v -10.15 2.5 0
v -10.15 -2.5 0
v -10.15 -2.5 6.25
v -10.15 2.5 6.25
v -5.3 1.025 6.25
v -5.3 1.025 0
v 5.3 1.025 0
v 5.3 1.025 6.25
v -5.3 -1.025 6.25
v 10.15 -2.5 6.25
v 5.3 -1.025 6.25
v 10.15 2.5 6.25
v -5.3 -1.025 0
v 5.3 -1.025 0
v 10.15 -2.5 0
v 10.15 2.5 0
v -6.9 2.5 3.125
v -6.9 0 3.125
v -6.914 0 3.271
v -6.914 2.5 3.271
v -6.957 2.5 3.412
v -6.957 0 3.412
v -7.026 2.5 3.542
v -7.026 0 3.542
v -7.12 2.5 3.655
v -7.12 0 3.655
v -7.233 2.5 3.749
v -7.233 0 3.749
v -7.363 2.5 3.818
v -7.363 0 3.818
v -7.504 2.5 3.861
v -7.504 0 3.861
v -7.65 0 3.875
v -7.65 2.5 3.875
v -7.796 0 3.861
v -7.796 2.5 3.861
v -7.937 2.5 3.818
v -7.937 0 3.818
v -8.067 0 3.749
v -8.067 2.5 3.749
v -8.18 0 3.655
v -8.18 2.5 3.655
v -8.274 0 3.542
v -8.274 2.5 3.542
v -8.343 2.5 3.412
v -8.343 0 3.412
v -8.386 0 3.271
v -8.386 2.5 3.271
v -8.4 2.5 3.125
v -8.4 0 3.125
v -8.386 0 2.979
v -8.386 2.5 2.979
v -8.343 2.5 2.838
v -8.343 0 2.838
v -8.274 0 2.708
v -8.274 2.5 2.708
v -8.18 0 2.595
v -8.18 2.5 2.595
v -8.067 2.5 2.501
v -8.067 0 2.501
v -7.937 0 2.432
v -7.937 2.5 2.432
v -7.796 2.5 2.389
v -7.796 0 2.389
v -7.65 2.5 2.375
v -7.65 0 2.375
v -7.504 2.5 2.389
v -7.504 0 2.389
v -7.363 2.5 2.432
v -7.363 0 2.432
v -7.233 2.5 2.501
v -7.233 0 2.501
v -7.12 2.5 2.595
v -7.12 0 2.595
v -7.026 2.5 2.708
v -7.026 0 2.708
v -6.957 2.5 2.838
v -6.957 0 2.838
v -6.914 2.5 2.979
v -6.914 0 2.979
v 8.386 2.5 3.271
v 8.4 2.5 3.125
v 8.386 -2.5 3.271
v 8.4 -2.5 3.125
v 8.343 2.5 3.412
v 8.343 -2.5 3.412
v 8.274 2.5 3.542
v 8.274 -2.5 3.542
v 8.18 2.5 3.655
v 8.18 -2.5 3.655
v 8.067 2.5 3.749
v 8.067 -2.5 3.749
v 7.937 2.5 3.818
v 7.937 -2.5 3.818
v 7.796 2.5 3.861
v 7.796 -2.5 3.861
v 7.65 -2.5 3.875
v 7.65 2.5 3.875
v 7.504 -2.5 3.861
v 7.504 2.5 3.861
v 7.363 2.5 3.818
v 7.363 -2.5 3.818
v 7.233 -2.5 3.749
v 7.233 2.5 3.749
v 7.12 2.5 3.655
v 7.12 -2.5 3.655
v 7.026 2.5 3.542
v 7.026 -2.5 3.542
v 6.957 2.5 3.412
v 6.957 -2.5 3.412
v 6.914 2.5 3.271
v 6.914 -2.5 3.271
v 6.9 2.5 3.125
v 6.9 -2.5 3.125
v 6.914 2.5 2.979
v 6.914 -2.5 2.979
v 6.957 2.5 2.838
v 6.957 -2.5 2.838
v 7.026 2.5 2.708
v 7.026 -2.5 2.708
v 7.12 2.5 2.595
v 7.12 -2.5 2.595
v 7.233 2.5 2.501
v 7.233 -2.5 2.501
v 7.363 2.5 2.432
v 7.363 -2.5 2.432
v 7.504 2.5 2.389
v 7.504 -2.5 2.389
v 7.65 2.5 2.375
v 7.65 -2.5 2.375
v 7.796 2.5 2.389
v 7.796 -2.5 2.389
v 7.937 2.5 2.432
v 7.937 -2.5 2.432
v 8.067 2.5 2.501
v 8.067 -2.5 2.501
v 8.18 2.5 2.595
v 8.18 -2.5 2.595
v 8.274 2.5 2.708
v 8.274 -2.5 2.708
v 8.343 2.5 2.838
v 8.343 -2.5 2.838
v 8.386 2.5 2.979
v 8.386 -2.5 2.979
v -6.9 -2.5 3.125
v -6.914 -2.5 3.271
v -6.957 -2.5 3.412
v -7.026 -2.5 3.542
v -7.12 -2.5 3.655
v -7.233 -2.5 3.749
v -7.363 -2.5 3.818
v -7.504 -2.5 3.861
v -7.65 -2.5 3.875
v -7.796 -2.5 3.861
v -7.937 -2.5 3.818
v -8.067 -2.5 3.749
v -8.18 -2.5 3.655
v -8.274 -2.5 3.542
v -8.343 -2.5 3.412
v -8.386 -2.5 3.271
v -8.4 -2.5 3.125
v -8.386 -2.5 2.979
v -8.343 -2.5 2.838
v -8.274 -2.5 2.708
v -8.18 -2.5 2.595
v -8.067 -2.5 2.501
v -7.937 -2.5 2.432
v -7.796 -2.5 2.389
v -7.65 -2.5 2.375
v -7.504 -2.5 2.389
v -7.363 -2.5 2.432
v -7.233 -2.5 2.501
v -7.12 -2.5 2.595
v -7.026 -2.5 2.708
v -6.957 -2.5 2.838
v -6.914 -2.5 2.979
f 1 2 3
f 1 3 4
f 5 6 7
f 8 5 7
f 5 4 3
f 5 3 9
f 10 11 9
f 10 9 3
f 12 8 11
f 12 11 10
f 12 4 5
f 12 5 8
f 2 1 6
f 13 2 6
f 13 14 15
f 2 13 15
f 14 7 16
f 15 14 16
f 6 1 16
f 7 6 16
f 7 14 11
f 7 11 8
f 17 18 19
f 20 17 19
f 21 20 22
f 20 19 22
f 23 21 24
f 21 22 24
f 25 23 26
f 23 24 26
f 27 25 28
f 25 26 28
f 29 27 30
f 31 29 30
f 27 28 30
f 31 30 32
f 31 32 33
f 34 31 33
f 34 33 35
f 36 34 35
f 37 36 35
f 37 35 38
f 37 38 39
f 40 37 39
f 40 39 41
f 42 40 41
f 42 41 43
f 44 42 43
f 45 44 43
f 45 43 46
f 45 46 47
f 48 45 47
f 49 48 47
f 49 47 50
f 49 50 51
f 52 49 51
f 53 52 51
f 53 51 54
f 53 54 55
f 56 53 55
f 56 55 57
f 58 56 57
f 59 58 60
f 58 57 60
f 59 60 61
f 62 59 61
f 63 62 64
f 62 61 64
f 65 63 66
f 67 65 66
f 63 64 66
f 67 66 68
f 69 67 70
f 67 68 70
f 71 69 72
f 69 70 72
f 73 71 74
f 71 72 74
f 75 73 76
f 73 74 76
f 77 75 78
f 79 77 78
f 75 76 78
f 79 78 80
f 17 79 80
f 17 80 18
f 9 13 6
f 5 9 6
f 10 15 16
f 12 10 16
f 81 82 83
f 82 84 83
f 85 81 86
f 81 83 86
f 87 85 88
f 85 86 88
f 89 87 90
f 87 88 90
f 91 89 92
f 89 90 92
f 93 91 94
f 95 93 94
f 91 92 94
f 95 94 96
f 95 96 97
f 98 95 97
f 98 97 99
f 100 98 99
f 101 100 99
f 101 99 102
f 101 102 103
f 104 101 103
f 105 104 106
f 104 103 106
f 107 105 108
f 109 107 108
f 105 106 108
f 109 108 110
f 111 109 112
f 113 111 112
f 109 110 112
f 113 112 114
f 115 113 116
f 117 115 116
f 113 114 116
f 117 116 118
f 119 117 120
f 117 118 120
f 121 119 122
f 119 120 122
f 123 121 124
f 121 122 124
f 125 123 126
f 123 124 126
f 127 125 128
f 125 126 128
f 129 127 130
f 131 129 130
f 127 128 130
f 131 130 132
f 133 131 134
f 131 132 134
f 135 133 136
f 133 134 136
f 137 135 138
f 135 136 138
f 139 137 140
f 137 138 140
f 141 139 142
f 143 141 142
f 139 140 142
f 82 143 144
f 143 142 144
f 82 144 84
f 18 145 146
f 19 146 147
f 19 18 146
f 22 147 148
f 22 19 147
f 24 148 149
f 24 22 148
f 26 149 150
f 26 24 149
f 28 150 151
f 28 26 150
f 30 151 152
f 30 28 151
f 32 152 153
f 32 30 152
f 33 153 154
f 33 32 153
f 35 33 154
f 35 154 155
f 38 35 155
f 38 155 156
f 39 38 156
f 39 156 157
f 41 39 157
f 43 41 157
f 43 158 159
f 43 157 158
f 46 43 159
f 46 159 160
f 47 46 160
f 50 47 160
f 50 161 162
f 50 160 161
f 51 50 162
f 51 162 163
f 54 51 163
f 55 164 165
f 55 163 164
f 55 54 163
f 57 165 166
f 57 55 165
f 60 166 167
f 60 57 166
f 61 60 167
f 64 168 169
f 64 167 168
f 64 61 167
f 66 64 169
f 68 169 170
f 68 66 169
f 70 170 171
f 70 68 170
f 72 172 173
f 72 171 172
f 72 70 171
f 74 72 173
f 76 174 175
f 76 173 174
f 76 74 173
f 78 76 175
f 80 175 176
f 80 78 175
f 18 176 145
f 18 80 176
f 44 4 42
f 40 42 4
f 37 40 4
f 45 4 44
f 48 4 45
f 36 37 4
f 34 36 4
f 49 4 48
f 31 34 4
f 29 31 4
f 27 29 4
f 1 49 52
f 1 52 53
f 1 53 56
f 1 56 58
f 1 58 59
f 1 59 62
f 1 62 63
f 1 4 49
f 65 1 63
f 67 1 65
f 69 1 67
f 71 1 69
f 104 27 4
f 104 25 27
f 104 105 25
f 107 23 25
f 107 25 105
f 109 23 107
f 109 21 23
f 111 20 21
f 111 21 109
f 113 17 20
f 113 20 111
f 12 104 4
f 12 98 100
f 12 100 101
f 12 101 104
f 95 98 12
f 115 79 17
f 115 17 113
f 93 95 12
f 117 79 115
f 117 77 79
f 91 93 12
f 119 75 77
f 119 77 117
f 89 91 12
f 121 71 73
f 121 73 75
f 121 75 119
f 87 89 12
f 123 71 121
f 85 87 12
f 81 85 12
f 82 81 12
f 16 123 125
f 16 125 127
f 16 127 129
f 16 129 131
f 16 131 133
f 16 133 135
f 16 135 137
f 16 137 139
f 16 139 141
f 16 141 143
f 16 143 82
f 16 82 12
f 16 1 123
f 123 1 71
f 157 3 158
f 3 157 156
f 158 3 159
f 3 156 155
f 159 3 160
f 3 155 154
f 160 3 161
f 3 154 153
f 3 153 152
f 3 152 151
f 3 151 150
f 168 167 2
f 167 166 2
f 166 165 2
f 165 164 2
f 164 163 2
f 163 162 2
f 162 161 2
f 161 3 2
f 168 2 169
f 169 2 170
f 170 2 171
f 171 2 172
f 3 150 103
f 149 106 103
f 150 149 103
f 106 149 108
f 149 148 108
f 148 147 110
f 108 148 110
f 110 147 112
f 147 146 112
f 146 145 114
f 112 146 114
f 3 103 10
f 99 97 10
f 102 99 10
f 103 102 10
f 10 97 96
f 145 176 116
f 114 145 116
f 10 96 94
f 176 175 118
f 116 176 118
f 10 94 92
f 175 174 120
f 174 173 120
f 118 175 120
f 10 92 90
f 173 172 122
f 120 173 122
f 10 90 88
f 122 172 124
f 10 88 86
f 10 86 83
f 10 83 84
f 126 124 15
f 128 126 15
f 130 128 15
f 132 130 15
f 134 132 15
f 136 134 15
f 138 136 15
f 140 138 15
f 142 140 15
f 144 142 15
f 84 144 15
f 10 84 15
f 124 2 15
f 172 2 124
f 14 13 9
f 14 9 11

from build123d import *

# Parameters (mm, degrees)
F0_W     = 20.3
F0_H     = 5
F0_W_2   = 10.6
F0_H_2   = 2.05
F1_DEPTH = 6.25
F2_R     = 0.75
F3_DEPTH = 3.9


with BuildPart() as f1:
    # F0 (on Top) → F1 (new body)
    with BuildSketch(Plane.XY):
        Rectangle(F0_W, F0_H)
        Rectangle(F0_W_2, F0_H_2, mode=Mode.SUBTRACT)
    extrude(amount=F1_DEPTH)

    # F2 (on Front) → F3 (cut, symmetric)
    with BuildSketch(Plane.XZ):
        with Locations((-7.65, 3.125)):
            Circle(F2_R)
        with Locations((7.65, 3.125)):
            Circle(F2_R)
    extrude(amount=F3_DEPTH, both=True, mode=Mode.SUBTRACT)


solid = f1.part
